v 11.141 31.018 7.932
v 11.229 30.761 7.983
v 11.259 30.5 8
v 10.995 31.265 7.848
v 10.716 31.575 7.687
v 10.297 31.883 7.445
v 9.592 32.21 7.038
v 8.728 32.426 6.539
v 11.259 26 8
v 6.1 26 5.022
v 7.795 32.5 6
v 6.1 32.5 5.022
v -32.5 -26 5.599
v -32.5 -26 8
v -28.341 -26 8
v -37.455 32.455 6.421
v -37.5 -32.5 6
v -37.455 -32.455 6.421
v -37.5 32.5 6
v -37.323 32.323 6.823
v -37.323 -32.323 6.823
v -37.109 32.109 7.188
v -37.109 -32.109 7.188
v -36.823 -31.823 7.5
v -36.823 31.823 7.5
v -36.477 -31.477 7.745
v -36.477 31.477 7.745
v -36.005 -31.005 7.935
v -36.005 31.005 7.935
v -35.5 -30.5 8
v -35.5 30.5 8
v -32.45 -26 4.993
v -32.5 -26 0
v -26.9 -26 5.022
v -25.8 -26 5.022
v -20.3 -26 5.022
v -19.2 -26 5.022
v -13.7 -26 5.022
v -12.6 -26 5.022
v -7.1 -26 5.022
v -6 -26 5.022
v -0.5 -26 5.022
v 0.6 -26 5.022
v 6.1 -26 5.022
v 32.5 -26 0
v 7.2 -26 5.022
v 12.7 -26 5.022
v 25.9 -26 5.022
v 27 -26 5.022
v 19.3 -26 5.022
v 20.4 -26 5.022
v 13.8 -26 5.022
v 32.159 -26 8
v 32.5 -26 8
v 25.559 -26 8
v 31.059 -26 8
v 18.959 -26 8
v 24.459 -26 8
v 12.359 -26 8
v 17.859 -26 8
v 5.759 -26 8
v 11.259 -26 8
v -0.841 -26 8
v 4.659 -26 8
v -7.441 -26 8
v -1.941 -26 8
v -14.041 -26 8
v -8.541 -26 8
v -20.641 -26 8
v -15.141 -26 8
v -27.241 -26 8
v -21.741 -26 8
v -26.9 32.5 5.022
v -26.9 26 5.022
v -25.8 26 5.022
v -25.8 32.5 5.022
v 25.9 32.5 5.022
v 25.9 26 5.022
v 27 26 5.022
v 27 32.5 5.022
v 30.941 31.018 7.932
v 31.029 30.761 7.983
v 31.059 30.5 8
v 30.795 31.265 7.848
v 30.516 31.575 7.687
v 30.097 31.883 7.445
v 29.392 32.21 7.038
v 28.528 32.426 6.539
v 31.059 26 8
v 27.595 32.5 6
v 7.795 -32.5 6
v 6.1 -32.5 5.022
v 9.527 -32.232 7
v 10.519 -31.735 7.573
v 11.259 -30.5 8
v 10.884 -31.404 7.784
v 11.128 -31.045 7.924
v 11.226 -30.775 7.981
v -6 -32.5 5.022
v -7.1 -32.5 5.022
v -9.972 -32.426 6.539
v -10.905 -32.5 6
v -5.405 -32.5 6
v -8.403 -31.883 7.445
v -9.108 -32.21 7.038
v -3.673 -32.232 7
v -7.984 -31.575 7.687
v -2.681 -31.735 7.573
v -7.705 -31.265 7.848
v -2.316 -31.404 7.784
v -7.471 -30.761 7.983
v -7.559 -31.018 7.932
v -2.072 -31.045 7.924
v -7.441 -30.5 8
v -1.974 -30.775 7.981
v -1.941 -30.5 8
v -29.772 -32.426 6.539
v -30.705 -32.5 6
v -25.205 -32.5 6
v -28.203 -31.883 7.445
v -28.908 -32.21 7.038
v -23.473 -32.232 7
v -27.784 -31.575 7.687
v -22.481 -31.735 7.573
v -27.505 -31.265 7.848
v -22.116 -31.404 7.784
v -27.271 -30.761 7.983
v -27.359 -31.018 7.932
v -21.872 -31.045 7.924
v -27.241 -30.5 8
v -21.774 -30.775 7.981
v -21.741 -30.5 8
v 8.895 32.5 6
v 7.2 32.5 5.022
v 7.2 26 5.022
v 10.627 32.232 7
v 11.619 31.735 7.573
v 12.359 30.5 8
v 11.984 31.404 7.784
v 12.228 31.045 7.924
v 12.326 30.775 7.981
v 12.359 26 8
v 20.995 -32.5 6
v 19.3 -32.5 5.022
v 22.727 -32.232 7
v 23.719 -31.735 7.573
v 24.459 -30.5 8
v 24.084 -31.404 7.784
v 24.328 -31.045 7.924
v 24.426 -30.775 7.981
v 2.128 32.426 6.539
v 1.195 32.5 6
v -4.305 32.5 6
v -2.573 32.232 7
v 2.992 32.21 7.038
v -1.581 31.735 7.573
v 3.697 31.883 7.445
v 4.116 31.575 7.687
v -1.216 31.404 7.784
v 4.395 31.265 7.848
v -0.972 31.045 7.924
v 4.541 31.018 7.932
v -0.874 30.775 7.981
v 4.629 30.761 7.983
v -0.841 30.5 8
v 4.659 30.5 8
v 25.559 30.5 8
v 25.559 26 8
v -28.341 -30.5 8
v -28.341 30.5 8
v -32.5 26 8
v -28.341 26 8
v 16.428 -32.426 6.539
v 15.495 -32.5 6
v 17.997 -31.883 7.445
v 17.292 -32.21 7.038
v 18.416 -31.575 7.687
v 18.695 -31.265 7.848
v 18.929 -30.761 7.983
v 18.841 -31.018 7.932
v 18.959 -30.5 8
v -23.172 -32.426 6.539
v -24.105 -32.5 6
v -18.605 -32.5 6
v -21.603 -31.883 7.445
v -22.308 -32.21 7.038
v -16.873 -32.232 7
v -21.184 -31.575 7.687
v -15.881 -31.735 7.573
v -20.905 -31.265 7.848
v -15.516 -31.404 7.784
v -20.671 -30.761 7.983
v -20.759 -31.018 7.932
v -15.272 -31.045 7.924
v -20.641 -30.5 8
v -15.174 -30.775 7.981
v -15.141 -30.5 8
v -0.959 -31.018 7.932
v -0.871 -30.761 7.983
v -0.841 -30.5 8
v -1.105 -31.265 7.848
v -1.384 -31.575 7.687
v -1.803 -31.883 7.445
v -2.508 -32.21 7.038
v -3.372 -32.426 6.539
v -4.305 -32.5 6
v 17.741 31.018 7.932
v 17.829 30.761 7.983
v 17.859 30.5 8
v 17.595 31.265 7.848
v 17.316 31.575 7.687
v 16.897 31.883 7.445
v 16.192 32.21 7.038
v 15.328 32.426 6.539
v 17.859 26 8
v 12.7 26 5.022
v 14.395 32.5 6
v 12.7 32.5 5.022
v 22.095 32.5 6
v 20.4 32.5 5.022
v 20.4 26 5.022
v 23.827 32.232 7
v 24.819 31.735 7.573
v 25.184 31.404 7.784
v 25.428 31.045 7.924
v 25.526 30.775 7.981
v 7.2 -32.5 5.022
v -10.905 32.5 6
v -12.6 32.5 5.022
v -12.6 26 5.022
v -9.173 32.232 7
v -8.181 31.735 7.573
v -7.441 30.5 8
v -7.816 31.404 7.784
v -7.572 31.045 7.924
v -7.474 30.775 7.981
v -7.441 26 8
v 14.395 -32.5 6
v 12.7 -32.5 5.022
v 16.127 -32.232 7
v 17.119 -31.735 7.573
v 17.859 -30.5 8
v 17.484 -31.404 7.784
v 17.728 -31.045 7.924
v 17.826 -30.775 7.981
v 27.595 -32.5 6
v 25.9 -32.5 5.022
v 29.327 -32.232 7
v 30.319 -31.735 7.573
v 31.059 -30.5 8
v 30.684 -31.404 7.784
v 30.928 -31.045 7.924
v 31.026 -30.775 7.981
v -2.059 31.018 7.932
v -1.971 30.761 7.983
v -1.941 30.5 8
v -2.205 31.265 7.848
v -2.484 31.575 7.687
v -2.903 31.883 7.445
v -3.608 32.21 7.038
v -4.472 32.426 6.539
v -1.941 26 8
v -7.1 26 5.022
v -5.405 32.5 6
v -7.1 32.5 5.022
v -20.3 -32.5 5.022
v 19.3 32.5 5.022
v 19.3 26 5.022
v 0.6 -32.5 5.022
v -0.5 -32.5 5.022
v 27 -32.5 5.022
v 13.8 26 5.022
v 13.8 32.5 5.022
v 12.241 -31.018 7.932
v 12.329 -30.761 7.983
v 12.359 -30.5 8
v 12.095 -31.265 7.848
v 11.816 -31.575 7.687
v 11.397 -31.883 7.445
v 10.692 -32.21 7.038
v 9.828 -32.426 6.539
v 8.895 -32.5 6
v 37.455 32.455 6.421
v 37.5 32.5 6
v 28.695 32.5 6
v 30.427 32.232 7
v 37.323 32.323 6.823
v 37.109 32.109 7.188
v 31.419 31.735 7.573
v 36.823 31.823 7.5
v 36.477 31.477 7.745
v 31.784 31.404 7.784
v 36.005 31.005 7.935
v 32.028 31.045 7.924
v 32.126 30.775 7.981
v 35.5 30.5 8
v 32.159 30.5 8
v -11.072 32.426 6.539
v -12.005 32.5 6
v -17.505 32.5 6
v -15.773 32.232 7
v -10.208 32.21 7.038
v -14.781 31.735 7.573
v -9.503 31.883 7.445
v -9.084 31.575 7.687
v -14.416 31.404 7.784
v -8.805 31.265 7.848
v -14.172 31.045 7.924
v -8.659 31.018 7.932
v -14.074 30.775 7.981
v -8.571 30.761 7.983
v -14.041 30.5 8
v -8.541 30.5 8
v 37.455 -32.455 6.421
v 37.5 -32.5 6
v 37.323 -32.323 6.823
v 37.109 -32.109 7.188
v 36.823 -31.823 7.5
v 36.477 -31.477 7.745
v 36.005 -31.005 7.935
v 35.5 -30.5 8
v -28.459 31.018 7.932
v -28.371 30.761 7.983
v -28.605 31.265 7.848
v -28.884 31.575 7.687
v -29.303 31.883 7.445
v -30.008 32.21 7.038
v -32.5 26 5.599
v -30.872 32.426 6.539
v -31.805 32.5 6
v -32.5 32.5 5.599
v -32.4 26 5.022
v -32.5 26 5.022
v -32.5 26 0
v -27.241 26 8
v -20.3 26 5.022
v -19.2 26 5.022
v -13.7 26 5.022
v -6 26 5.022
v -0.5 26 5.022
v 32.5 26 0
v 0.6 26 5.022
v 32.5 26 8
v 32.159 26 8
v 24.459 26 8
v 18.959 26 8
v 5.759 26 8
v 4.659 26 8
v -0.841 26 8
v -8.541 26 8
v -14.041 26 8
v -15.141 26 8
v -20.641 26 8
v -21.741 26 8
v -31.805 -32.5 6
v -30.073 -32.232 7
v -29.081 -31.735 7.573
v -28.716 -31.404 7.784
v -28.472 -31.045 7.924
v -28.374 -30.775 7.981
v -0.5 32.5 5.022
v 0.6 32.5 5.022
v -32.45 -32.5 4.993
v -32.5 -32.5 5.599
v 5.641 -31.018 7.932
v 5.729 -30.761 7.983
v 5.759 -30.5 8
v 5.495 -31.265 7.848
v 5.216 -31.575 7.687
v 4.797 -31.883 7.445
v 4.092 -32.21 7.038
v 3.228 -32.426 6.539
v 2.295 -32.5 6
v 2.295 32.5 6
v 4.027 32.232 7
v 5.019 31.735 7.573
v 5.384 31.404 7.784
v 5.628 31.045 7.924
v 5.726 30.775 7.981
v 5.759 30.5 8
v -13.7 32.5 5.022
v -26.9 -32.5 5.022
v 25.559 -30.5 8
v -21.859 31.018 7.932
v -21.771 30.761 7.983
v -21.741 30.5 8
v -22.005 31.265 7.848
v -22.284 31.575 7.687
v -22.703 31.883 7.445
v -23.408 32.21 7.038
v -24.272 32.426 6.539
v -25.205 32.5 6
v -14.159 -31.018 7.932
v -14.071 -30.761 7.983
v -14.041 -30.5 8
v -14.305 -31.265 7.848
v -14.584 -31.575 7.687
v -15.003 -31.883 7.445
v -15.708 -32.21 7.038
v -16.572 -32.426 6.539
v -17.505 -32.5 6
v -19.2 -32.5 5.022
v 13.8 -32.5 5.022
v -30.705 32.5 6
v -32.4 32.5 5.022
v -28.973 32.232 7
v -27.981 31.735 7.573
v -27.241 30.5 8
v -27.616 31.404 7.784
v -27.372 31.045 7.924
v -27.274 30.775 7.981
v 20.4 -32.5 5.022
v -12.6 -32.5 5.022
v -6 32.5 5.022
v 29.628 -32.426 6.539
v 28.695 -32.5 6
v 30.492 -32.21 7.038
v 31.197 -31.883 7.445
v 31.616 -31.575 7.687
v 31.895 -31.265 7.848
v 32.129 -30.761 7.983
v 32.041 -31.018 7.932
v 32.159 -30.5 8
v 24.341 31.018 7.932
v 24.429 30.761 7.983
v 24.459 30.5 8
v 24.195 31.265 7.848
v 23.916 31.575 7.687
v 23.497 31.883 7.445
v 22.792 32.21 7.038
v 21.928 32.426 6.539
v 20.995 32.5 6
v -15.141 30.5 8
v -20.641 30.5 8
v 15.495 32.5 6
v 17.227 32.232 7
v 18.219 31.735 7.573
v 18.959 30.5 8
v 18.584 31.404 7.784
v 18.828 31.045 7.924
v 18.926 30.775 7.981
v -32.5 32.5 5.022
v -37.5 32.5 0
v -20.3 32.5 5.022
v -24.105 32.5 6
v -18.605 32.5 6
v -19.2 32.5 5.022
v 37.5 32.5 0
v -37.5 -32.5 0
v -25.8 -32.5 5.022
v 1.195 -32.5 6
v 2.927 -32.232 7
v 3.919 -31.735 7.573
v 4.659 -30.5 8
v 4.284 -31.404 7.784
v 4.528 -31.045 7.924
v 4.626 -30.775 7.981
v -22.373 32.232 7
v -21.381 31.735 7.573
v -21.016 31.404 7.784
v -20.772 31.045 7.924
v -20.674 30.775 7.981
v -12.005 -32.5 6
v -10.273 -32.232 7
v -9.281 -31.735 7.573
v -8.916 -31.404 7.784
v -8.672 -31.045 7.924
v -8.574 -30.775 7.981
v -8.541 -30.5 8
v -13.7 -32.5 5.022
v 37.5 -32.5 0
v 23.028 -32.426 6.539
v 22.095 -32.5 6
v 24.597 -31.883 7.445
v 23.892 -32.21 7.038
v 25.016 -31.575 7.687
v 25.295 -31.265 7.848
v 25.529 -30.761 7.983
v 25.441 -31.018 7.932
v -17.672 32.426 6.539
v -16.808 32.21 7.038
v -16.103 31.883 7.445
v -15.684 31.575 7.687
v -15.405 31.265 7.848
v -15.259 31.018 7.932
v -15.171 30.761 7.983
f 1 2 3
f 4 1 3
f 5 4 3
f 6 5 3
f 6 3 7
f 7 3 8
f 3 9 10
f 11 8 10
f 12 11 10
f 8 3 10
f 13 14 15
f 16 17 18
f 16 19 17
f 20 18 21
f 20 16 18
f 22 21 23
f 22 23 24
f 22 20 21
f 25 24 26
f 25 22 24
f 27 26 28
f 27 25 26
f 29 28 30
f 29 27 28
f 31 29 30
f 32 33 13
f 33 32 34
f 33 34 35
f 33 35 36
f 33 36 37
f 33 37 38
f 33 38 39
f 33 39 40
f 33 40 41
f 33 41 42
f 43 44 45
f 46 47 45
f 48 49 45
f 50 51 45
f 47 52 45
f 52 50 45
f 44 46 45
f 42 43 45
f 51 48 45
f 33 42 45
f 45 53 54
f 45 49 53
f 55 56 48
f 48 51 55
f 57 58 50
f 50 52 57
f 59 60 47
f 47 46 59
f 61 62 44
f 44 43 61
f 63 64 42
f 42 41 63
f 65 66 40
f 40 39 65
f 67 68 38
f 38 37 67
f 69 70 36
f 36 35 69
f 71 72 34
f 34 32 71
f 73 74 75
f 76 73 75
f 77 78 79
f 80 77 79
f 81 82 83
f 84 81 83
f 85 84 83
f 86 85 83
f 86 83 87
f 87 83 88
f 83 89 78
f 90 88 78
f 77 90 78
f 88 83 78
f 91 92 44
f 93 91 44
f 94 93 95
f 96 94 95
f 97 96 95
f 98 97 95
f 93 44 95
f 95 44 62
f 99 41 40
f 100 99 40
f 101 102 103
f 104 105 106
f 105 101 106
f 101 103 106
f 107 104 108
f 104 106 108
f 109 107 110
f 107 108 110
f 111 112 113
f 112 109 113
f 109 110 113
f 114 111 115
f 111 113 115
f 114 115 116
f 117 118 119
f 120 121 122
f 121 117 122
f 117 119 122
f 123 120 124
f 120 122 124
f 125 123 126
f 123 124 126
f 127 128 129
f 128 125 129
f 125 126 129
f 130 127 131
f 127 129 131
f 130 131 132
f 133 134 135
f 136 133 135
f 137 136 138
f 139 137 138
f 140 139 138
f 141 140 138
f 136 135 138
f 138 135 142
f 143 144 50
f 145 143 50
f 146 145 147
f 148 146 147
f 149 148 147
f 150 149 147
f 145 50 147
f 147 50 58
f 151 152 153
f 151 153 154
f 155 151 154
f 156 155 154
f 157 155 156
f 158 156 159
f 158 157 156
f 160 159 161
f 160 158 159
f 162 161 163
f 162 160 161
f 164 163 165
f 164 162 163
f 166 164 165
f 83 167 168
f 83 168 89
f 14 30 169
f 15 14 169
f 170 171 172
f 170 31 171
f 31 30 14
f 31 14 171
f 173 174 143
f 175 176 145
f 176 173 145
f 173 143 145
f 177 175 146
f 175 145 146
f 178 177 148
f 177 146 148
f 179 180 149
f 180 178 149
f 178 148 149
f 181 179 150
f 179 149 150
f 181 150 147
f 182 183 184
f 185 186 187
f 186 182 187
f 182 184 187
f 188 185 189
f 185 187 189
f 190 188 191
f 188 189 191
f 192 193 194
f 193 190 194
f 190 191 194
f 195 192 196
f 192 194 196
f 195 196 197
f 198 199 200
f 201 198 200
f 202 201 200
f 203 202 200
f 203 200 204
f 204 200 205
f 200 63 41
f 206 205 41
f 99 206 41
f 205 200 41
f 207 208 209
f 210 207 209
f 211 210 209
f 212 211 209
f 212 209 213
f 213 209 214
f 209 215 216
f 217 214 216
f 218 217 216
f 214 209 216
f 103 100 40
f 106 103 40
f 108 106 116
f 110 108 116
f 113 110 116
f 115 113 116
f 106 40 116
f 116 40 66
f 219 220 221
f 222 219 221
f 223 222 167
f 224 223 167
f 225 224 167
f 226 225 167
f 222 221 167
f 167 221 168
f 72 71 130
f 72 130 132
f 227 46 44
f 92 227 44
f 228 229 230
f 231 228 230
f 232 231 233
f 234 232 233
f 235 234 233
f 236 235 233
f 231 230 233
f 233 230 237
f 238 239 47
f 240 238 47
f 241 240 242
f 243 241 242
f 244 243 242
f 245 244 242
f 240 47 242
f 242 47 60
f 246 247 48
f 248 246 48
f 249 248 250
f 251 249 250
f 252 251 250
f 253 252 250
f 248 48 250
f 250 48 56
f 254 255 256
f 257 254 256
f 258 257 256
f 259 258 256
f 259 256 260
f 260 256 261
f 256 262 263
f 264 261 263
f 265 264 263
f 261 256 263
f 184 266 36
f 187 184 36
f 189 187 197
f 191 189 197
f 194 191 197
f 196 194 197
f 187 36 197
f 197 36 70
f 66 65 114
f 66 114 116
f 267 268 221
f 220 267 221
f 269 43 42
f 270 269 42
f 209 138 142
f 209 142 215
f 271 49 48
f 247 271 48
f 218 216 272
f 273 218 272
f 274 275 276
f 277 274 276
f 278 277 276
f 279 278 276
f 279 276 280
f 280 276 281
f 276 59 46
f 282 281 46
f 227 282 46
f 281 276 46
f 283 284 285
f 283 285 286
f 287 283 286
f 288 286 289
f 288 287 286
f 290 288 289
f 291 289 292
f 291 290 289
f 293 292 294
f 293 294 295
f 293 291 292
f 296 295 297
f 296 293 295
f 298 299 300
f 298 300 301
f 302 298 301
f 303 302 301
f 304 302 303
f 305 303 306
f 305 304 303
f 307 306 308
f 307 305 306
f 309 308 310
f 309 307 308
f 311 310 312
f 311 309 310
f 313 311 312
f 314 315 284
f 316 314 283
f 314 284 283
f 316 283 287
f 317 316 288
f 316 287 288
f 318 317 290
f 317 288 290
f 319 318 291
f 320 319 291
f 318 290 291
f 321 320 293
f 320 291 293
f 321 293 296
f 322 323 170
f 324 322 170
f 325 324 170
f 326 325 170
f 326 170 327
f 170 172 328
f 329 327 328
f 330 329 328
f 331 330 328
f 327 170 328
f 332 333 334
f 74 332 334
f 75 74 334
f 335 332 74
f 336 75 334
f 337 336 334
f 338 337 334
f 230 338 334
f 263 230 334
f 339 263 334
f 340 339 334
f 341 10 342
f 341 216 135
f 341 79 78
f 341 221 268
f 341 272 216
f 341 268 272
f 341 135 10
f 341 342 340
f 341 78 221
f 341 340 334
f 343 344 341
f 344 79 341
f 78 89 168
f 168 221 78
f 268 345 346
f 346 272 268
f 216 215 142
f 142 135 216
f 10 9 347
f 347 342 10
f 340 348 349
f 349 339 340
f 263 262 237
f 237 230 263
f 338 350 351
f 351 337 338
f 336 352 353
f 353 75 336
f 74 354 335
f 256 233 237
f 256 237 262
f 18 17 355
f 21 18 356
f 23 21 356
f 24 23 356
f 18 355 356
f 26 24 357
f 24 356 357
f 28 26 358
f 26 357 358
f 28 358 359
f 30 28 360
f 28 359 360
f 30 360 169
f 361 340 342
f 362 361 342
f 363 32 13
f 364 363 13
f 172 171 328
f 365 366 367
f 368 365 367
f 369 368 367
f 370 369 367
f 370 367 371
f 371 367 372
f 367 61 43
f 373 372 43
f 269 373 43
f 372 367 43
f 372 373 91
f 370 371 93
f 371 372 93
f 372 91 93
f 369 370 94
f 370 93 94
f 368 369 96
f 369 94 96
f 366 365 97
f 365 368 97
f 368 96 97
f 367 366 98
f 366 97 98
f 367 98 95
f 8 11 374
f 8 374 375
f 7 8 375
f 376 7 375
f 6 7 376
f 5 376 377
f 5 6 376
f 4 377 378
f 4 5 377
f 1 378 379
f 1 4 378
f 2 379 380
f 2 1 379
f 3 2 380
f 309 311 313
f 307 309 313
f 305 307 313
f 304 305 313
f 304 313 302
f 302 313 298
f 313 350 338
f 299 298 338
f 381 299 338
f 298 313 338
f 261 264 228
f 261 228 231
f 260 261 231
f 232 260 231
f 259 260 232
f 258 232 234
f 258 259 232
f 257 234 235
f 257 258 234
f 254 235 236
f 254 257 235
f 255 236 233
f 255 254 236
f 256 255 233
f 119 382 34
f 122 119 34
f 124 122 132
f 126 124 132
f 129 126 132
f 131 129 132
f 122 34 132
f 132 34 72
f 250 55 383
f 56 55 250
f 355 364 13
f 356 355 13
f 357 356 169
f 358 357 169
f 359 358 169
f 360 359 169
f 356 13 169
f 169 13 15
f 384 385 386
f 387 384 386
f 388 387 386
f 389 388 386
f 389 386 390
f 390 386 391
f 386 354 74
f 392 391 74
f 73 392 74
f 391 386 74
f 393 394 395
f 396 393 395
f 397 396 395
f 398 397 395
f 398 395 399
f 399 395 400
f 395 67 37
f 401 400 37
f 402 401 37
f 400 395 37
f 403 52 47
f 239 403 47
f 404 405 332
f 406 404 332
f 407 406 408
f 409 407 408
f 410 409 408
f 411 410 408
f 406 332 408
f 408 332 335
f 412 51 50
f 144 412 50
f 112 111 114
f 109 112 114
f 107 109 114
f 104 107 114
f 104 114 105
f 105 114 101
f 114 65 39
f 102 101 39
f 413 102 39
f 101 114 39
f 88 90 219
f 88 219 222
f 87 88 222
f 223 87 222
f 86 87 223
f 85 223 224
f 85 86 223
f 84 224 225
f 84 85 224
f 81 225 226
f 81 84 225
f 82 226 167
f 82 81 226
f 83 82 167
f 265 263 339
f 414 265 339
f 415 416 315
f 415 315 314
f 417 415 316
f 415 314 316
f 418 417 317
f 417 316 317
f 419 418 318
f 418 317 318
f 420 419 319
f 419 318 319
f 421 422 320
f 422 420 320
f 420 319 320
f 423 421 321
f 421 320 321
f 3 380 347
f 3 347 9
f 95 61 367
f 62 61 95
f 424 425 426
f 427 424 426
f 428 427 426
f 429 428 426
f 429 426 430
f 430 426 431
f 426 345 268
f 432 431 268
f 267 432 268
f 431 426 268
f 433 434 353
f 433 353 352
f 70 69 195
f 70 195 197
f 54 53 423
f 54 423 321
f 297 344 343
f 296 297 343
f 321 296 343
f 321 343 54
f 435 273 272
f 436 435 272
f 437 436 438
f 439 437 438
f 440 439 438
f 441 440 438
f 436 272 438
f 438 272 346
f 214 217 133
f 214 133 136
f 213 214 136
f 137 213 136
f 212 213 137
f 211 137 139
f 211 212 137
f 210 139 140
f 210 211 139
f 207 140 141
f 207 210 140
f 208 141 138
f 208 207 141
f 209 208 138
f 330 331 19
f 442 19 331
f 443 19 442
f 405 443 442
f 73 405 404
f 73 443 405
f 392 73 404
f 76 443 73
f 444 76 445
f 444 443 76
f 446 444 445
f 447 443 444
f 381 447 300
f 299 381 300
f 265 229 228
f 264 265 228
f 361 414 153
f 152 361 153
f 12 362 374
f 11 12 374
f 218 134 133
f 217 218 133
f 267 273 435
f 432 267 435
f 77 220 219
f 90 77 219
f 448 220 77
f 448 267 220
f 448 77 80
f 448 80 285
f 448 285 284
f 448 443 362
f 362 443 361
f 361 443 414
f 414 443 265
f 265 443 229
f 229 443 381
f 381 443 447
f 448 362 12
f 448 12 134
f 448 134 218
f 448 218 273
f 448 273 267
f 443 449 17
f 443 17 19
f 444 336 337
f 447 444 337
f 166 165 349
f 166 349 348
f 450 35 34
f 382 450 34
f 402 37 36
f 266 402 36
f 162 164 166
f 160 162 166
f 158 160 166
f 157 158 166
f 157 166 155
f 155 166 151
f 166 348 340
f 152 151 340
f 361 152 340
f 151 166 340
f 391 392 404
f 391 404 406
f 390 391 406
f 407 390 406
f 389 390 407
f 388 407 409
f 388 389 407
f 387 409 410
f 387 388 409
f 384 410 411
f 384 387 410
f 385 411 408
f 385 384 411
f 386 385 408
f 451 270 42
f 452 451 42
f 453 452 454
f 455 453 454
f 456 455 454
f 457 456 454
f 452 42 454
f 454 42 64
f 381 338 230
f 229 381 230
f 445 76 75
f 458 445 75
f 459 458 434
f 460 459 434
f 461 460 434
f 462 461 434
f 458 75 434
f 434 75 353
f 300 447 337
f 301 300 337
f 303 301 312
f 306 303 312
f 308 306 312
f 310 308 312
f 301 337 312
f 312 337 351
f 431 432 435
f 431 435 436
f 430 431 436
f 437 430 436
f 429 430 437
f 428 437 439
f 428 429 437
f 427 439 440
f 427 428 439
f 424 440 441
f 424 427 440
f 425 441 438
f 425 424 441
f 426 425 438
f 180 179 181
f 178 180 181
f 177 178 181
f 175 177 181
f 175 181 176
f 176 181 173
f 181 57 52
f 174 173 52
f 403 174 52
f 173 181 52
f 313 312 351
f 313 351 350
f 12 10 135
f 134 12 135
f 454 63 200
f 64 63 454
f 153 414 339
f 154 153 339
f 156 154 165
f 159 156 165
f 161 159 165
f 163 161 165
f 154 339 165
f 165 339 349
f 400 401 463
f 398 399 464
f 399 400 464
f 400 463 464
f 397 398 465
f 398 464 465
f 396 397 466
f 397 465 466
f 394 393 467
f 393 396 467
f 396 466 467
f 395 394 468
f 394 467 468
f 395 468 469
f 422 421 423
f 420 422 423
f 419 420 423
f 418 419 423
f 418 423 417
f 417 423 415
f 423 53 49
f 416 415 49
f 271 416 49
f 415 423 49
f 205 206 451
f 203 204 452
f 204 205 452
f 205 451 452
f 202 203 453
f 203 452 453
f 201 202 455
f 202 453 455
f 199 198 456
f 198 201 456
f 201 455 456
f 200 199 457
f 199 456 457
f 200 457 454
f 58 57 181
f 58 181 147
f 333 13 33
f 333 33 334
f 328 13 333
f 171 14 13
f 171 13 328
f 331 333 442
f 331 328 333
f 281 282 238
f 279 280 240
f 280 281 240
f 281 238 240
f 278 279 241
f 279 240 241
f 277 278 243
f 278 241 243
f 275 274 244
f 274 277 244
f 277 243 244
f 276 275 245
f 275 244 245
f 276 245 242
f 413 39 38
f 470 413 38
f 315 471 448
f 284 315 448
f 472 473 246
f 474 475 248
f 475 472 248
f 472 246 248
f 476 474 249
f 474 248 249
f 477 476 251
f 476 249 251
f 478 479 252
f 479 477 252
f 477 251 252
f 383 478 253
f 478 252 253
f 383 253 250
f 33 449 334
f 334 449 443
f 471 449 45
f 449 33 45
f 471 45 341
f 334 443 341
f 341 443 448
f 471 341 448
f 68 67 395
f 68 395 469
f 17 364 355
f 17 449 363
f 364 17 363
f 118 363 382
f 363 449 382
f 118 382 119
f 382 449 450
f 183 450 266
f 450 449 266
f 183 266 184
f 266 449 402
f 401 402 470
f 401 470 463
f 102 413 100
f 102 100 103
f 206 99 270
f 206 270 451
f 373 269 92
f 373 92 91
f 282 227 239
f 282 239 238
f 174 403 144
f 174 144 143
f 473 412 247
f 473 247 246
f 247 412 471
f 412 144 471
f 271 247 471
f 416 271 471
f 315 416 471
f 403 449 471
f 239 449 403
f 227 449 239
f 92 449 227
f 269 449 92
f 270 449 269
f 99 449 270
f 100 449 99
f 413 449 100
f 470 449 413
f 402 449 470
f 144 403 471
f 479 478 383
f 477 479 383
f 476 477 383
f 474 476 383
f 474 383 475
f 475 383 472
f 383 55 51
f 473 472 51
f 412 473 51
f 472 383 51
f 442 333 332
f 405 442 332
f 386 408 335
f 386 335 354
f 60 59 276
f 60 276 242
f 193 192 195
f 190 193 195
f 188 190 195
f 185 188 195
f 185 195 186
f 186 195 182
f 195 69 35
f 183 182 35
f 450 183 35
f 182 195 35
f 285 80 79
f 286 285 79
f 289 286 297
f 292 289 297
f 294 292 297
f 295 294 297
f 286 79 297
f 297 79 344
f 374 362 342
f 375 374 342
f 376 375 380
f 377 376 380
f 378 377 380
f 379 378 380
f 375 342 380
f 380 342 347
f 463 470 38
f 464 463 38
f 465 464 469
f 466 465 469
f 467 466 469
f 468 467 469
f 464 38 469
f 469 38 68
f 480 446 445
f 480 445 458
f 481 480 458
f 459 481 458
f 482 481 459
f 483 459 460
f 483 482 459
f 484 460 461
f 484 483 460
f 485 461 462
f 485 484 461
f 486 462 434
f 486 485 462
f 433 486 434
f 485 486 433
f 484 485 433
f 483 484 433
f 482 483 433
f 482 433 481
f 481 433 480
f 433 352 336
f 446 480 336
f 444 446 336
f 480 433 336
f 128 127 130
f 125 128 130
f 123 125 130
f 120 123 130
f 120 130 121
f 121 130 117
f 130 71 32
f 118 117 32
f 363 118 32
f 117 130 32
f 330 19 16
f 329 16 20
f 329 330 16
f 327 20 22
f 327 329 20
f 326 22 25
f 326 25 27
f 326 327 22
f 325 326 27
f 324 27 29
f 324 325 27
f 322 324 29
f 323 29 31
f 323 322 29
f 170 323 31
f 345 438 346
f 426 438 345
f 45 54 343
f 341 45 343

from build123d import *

# Parameters (mm, degrees)
F0_W     = 75
F0_H     = 65
F1_DEPTH = 8
F2_R     = 2
F3_W     = 65
F3_H     = 52
F4_DEPTH = 8.001
F7_DEPTH = 6.501
F8_DEPTH = 6.501


with BuildPart() as f1:
    # F0 (on Top) → F1 (new body)
    with BuildSketch(Plane.XY):
        Rectangle(F0_W, F0_H)
    extrude(amount=F1_DEPTH)

    # F2
    f2_edges = [f1.edges().sort_by_distance(p)[0] for p in [
        (0, -32.5, 8),
        (37.5, 0, 8),
        (0, 32.5, 8),
        (-37.5, 0, 8),
    ]]
    fillet(f2_edges, radius=F2_R)

    # F3 (on face) → F4 (cut, through all)
    with BuildSketch(Plane.XY.offset(8)):
        Rectangle(F3_W, F3_H)
    extrude(amount=-F4_DEPTH, mode=Mode.SUBTRACT)

    # F5 (on face) → F7 (cut, through all)
    with BuildSketch(Plane.XZ.offset(-26)):
        Polygon((-27.241326, 8), (-28.341326, 8), (-32.5, 5.598989), (-32.5, 5.021638), (-32.4, 5.021638), align=None)
        Polygon((-20.641326, 8), (-21.741326, 8), (-26.9, 5.021638), (-25.8, 5.021638), align=None)
        Polygon((-14.041326, 8), (-15.141326, 8), (-20.3, 5.021638), (-19.2, 5.021638), align=None)
        Polygon((-7.441326, 8), (-8.541326, 8), (-13.7, 5.021638), (-12.6, 5.021638), align=None)
        Polygon((-0.841326, 8), (-1.941326, 8), (-7.1, 5.021638), (-6, 5.021638), align=None)
        Polygon((5.758674, 8), (4.658674, 8), (-0.5, 5.021638), (0.6, 5.021638), align=None)
        Polygon((12.358674, 8), (11.258674, 8), (6.1, 5.021638), (7.2, 5.021638), align=None)
        Polygon((13.8, 5.021638), (18.958674, 8), (17.858674, 8), (12.7, 5.021638), align=None)
        Polygon((20.4, 5.021638), (25.558674, 8), (24.458674, 8), (19.3, 5.021638), align=None)
        Polygon((27, 5.021638), (32.158674, 8), (31.058674, 8), (25.9, 5.021638), align=None)
    extrude(amount=-F7_DEPTH, mode=Mode.SUBTRACT)

    # F6 (on face) → F8 (cut, through all)
    with BuildSketch(Plane(origin=(0, -26, 0), x_dir=(-1, 0, 0), z_dir=(0, 1, 0))):
        Polygon((32.5, 5.598989), (28.341326, 8), (27.241326, 8), (32.45, 4.992771), align=None)
        Polygon((26.9, 5.021638), (21.741326, 8), (20.641326, 8), (25.8, 5.021638), align=None)
        Polygon((20.3, 5.021638), (15.141326, 8), (14.041326, 8), (19.2, 5.021638), align=None)
        Polygon((13.7, 5.021638), (8.541326, 8), (7.441326, 8), (12.6, 5.021638), align=None)
        Polygon((7.1, 5.021638), (1.941326, 8), (0.841326, 8), (6, 5.021638), align=None)
        Polygon((0.5, 5.021638), (-4.658674, 8), (-5.758674, 8), (-0.6, 5.021638), align=None)
        Polygon((-11.258674, 8), (-12.358674, 8), (-7.2, 5.021638), (-6.1, 5.021638), align=None)
        Polygon((-17.858674, 8), (-18.958674, 8), (-13.8, 5.021638), (-12.7, 5.021638), align=None)
        Polygon((-24.458674, 8), (-25.558674, 8), (-20.4, 5.021638), (-19.3, 5.021638), align=None)
        Polygon((-31.058674, 8), (-32.158674, 8), (-27, 5.021638), (-25.9, 5.021638), align=None)
    extrude(amount=-F8_DEPTH, mode=Mode.SUBTRACT)


solid = f1.part
